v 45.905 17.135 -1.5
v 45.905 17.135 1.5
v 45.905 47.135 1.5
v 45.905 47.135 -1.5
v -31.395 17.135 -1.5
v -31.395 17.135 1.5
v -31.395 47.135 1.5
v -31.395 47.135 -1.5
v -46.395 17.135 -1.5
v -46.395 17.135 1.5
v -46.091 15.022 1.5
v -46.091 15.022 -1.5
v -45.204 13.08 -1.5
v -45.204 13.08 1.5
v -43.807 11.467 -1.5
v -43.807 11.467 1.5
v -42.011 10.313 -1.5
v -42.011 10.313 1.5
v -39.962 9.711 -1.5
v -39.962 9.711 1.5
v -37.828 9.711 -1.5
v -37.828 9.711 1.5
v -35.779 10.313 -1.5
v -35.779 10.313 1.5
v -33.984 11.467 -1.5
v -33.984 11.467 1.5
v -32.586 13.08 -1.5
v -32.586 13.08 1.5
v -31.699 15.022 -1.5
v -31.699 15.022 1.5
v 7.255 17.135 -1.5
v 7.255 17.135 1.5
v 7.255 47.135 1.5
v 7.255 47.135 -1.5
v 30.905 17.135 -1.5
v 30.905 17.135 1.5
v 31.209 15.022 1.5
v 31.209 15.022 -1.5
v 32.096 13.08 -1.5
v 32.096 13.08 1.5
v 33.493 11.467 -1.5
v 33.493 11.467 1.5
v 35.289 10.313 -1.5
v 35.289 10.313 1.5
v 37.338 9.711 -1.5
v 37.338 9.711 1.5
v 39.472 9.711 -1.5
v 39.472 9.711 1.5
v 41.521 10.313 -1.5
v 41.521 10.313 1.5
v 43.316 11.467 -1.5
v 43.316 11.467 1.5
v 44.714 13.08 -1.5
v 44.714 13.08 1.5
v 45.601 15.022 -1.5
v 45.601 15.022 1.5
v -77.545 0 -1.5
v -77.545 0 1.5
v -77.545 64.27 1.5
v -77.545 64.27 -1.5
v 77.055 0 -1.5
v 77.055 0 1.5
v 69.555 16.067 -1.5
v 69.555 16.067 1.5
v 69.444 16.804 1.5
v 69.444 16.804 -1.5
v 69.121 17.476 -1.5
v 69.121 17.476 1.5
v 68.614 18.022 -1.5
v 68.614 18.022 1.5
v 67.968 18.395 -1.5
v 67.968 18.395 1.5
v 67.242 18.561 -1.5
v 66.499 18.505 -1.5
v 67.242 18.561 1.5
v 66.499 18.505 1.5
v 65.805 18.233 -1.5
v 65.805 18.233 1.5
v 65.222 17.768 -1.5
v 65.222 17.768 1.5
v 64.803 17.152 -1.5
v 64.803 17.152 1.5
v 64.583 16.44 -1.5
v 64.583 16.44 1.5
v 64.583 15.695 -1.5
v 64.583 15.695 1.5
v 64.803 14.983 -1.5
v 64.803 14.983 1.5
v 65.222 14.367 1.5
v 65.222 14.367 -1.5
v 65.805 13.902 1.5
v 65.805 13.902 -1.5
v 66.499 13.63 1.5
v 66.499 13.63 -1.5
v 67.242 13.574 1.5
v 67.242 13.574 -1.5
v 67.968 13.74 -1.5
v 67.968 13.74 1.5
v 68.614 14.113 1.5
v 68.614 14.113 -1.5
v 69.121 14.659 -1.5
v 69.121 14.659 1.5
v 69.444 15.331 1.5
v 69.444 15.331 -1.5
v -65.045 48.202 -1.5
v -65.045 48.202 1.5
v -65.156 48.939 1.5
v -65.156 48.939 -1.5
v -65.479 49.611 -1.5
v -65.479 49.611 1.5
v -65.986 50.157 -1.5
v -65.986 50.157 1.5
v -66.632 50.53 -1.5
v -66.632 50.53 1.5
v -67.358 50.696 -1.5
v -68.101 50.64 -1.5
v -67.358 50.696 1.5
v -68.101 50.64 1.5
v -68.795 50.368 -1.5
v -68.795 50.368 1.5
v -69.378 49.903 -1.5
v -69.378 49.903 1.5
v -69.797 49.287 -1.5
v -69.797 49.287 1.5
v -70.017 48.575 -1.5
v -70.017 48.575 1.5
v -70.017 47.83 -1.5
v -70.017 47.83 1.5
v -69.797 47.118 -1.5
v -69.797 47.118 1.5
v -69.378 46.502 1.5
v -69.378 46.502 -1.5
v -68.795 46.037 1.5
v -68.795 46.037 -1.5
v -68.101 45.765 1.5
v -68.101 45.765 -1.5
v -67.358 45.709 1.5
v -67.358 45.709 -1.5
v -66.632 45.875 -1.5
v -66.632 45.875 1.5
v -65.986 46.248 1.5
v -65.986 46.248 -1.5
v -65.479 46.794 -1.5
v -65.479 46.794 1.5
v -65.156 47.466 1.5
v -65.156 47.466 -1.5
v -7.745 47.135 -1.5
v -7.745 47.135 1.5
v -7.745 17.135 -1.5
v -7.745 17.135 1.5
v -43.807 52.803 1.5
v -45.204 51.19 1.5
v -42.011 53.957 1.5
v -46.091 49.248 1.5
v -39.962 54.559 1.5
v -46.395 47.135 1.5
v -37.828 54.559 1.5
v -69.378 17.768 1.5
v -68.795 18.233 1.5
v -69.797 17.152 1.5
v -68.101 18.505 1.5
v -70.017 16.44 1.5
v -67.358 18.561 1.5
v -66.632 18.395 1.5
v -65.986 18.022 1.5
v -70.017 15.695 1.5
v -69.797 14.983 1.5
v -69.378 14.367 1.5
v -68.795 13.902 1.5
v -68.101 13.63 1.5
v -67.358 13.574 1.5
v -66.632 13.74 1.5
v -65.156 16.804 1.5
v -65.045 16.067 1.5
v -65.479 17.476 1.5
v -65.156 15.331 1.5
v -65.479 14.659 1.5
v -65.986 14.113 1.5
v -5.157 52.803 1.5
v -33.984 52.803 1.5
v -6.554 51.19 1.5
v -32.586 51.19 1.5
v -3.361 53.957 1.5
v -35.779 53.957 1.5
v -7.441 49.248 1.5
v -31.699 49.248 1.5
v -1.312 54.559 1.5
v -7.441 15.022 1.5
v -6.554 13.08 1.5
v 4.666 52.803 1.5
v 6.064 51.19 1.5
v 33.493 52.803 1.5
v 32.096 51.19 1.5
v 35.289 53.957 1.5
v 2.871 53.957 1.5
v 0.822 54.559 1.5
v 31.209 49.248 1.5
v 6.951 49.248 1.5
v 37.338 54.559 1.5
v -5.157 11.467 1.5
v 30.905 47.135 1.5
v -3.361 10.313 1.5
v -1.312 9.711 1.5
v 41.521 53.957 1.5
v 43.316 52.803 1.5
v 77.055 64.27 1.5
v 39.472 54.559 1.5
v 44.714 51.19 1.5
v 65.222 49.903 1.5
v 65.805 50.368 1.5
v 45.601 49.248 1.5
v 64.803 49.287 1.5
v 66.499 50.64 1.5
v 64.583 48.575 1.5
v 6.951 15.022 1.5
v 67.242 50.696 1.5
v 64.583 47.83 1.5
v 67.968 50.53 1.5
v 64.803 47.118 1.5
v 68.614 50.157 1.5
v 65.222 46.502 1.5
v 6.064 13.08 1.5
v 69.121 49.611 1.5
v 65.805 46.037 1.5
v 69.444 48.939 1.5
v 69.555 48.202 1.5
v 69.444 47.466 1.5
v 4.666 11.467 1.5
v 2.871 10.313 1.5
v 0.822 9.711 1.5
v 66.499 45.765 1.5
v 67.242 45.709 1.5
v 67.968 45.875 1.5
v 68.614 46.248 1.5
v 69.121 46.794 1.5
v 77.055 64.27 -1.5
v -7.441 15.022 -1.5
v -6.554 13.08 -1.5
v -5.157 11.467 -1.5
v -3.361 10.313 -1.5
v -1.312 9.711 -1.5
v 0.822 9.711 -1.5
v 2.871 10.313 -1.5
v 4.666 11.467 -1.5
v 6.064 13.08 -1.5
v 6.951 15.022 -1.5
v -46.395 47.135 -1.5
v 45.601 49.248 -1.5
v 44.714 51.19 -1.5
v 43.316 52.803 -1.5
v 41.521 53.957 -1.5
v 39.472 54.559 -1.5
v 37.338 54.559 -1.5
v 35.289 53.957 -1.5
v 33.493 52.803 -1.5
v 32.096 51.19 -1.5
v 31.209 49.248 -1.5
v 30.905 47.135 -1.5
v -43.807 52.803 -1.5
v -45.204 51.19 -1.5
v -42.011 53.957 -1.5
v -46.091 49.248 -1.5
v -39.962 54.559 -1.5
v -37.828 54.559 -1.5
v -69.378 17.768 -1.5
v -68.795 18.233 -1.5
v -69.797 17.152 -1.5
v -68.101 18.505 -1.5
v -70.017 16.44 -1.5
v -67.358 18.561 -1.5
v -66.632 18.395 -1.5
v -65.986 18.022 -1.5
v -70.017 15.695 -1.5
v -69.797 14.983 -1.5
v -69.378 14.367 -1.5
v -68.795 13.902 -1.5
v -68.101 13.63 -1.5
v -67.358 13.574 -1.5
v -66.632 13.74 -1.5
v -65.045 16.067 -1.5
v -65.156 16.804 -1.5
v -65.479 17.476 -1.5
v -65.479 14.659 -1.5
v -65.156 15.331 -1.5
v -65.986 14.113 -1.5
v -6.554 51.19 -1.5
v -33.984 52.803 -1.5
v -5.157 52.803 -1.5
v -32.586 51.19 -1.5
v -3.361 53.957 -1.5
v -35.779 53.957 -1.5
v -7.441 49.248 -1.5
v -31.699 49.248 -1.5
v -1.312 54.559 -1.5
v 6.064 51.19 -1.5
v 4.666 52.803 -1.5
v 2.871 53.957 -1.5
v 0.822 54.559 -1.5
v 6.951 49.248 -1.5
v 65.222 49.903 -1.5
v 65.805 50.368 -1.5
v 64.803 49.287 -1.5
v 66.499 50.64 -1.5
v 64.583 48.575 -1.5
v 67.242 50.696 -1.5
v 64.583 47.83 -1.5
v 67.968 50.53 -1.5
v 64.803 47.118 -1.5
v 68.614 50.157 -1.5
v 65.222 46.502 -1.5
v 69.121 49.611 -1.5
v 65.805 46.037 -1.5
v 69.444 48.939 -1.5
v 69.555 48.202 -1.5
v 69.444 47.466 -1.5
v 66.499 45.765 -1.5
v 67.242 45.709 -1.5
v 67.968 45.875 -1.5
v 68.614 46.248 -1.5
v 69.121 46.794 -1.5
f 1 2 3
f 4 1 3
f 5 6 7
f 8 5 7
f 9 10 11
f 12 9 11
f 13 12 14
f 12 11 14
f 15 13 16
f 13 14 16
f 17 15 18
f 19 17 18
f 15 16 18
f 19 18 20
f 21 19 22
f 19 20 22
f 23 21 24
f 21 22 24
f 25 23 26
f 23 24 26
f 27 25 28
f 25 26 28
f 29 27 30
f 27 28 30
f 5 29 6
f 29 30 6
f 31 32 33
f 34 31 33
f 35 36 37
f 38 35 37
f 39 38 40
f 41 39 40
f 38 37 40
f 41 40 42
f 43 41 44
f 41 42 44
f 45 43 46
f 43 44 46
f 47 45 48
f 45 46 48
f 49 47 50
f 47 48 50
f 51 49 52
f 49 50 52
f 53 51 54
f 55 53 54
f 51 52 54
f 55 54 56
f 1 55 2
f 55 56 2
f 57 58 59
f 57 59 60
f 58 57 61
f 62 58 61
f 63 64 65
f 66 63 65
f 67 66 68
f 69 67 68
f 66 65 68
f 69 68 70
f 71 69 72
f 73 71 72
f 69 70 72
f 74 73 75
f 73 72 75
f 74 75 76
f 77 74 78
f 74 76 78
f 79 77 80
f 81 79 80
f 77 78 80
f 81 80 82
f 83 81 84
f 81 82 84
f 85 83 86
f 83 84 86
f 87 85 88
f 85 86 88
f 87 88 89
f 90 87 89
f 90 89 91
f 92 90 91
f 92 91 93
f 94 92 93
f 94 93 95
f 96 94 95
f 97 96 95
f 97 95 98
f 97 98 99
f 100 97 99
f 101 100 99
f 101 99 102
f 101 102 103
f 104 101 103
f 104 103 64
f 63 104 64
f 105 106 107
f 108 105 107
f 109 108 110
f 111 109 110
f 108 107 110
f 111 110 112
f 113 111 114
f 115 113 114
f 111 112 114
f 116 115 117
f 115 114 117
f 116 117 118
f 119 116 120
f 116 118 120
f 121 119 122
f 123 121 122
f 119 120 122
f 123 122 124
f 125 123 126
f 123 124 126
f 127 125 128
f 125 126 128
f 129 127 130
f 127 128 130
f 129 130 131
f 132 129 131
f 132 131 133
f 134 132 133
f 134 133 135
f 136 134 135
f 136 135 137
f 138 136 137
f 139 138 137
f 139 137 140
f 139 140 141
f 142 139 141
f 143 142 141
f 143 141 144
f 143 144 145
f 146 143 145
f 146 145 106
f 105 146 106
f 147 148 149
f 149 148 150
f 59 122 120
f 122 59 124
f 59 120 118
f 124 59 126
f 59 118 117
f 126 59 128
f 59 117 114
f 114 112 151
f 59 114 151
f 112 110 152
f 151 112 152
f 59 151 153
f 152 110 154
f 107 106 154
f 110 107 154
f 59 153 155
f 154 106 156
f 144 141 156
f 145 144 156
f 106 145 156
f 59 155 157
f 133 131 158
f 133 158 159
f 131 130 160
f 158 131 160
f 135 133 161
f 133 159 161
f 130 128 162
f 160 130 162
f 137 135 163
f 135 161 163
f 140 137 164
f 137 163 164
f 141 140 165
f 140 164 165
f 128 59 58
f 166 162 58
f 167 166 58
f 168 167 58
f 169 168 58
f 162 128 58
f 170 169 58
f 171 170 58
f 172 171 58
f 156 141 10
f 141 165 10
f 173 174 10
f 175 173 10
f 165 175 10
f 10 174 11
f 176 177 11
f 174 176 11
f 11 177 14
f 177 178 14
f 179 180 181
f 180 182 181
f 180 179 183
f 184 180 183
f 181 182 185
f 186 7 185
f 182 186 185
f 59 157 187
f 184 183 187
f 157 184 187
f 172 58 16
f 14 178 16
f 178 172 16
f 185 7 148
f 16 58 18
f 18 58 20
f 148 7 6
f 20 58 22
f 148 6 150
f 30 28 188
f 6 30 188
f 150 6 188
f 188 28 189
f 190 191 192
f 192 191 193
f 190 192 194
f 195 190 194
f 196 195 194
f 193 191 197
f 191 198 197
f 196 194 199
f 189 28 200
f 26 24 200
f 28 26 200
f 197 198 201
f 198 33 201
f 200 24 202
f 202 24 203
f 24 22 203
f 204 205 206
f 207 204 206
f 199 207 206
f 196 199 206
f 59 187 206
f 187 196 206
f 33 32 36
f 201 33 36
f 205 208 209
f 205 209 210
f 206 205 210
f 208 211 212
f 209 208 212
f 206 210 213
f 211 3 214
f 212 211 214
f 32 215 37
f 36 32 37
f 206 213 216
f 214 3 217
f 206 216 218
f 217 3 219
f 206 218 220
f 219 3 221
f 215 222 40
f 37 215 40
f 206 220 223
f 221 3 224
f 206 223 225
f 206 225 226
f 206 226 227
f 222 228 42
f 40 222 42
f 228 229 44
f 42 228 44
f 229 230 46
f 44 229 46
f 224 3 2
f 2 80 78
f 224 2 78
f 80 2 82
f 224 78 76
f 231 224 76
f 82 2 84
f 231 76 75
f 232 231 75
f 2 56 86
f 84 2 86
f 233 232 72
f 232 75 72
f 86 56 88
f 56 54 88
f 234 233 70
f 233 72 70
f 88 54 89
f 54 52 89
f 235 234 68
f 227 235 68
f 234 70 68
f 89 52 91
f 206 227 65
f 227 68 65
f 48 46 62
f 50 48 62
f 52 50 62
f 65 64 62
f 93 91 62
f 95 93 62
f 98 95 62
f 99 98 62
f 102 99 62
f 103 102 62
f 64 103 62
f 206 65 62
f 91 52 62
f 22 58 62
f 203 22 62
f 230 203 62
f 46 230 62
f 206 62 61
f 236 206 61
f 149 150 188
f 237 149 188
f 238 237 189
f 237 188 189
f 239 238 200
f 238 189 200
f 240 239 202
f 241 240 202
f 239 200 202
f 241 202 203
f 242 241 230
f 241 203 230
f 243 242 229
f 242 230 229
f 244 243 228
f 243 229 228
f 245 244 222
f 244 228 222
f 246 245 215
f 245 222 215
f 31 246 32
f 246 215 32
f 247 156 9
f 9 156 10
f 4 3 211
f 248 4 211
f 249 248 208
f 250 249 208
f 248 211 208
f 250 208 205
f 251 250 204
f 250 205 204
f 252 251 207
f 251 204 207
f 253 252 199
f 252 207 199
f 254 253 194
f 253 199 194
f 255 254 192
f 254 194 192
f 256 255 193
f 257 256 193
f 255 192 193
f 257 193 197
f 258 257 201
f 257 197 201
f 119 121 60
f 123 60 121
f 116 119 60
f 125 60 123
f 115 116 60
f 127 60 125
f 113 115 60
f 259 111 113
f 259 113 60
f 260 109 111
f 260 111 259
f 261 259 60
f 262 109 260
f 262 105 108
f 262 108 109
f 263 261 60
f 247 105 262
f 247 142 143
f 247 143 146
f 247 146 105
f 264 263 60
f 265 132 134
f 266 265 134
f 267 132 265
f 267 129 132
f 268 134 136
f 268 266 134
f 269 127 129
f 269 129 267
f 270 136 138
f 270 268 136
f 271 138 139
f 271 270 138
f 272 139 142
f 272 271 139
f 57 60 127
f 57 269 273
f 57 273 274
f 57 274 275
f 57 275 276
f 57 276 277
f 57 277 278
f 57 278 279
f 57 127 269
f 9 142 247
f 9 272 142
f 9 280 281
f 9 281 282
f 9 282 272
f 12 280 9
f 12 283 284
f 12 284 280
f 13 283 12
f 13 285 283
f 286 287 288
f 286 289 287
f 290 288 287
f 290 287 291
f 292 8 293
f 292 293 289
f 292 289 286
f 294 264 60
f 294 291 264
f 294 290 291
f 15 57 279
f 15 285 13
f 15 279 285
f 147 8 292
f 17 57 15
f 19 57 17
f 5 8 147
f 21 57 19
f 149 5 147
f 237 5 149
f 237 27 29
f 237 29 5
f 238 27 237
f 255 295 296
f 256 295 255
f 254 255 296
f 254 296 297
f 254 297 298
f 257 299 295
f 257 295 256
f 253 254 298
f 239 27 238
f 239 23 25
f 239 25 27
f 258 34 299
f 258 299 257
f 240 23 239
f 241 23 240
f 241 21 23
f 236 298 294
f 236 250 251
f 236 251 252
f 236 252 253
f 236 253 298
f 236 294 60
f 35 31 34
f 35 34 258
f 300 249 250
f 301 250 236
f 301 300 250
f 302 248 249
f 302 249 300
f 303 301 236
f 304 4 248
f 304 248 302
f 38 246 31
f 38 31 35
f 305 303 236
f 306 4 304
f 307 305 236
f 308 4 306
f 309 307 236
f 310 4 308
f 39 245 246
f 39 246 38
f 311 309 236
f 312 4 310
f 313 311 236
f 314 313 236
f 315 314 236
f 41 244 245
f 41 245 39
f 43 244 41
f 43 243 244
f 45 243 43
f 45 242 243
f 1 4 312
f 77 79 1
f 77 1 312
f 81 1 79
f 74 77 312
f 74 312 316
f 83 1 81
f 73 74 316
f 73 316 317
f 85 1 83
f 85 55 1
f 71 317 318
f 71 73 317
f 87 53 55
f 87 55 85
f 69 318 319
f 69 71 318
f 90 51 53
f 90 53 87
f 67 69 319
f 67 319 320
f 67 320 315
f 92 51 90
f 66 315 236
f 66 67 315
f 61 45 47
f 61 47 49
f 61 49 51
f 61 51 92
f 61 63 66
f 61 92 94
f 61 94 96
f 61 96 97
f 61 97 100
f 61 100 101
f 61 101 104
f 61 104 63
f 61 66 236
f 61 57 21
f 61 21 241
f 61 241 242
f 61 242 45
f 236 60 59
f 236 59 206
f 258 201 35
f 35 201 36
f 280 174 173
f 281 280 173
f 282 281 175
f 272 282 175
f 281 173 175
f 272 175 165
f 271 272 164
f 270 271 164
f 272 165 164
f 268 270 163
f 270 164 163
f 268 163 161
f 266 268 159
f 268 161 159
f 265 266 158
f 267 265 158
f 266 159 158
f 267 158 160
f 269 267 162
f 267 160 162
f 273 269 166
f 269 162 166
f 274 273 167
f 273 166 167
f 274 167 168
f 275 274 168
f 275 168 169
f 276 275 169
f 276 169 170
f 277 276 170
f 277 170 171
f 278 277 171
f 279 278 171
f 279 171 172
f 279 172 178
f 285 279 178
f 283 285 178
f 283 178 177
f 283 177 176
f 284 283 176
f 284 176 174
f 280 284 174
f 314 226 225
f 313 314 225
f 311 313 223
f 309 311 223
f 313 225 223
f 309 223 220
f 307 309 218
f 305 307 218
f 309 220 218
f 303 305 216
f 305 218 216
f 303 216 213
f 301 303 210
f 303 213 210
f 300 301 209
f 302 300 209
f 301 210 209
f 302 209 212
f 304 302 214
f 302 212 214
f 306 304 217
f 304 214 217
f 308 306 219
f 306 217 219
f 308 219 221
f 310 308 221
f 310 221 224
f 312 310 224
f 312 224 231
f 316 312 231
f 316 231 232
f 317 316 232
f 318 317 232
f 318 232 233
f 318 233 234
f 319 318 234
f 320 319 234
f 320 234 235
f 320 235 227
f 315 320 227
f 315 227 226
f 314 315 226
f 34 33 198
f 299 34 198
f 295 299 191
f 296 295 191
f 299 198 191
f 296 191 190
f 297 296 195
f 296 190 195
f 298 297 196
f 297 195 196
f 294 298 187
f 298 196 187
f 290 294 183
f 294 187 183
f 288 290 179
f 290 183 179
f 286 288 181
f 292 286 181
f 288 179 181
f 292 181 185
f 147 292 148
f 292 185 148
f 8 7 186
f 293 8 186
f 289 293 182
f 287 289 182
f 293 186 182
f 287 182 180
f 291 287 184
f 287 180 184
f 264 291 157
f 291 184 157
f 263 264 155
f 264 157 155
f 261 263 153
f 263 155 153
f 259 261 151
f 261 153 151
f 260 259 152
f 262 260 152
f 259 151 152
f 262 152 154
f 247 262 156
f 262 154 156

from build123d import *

# Parameters (mm, degrees)
ESQUISSE2_W             = 154.6
ESQUISSE2_H             = 3
BOSS_EXTRU_1_DEPTH      = 64.27
ESQUISSE3_R             = 2.5
ENL_V_MAT_EXTRU_1_DEPTH = 101.761443216
ENL_V_MAT_EXTRU_2_DEPTH = 101.761443216


with BuildPart() as part:
    # Esquisse2 → Boss.-Extru.1 (new body)
    with BuildSketch(Plane(origin=(0, 0, 0), x_dir=(1, 0, 0), z_dir=(0, 1, 0))):
        with Locations((-0.245054897, 0)):
            Rectangle(ESQUISSE2_W, ESQUISSE2_H)
    extrude(amount=BOSS_EXTRU_1_DEPTH)

    # Esquisse3 → Enlèv. mat.-Extru.1 (cut, through all)
    with BuildSketch(Plane.XY.offset(1.5)):
        with Locations((-67.545054897, 16.0675)):
            Circle(ESQUISSE3_R)
        with Locations((-67.545054897, 48.2025)):
            Circle(ESQUISSE3_R)
        with Locations((67.054945103, 48.2025)):
            Circle(ESQUISSE3_R)
        with Locations((67.054945103, 16.0675)):
            Circle(ESQUISSE3_R)
    extrude(amount=-ENL_V_MAT_EXTRU_1_DEPTH, mode=Mode.SUBTRACT)

    # Esquisse4 → Enlèv. mat.-Extru.2 (cut, through all)
    with BuildSketch(Plane.XY.offset(1.5)):
        with BuildLine():
            Line((-46.395054897, 47.135), (-46.395054897, 17.135))
            ThreePointArc((-46.395054897, 17.135), (-38.895054897, 9.635), (-31.395054897, 17.135))
            Line((-31.395054897, 17.135), (-31.395054897, 47.135))
            ThreePointArc((-31.395054897, 47.135), (-38.895054897, 54.635), (-46.395054897, 47.135))
        make_face()
        with BuildLine():
            Line((-7.745054897, 47.135), (-7.745054897, 17.135))
            ThreePointArc((-7.745054897, 17.135), (-0.245054897, 9.635), (7.254945103, 17.135))
            Line((7.254945103, 17.135), (7.254945103, 47.135))
            ThreePointArc((7.254945103, 47.135), (-0.245054897, 54.635), (-7.745054897, 47.135))
        make_face()
        with BuildLine():
            Line((30.904945103, 47.135), (30.904945103, 17.135))
            ThreePointArc((30.904945103, 17.135), (38.404945103, 9.635), (45.904945103, 17.135))
            Line((45.904945103, 17.135), (45.904945103, 47.135))
            ThreePointArc((45.904945103, 47.135), (38.404945103, 54.635), (30.904945103, 47.135))
        make_face()
    extrude(amount=-ENL_V_MAT_EXTRU_2_DEPTH, mode=Mode.SUBTRACT)


solid = part.part
